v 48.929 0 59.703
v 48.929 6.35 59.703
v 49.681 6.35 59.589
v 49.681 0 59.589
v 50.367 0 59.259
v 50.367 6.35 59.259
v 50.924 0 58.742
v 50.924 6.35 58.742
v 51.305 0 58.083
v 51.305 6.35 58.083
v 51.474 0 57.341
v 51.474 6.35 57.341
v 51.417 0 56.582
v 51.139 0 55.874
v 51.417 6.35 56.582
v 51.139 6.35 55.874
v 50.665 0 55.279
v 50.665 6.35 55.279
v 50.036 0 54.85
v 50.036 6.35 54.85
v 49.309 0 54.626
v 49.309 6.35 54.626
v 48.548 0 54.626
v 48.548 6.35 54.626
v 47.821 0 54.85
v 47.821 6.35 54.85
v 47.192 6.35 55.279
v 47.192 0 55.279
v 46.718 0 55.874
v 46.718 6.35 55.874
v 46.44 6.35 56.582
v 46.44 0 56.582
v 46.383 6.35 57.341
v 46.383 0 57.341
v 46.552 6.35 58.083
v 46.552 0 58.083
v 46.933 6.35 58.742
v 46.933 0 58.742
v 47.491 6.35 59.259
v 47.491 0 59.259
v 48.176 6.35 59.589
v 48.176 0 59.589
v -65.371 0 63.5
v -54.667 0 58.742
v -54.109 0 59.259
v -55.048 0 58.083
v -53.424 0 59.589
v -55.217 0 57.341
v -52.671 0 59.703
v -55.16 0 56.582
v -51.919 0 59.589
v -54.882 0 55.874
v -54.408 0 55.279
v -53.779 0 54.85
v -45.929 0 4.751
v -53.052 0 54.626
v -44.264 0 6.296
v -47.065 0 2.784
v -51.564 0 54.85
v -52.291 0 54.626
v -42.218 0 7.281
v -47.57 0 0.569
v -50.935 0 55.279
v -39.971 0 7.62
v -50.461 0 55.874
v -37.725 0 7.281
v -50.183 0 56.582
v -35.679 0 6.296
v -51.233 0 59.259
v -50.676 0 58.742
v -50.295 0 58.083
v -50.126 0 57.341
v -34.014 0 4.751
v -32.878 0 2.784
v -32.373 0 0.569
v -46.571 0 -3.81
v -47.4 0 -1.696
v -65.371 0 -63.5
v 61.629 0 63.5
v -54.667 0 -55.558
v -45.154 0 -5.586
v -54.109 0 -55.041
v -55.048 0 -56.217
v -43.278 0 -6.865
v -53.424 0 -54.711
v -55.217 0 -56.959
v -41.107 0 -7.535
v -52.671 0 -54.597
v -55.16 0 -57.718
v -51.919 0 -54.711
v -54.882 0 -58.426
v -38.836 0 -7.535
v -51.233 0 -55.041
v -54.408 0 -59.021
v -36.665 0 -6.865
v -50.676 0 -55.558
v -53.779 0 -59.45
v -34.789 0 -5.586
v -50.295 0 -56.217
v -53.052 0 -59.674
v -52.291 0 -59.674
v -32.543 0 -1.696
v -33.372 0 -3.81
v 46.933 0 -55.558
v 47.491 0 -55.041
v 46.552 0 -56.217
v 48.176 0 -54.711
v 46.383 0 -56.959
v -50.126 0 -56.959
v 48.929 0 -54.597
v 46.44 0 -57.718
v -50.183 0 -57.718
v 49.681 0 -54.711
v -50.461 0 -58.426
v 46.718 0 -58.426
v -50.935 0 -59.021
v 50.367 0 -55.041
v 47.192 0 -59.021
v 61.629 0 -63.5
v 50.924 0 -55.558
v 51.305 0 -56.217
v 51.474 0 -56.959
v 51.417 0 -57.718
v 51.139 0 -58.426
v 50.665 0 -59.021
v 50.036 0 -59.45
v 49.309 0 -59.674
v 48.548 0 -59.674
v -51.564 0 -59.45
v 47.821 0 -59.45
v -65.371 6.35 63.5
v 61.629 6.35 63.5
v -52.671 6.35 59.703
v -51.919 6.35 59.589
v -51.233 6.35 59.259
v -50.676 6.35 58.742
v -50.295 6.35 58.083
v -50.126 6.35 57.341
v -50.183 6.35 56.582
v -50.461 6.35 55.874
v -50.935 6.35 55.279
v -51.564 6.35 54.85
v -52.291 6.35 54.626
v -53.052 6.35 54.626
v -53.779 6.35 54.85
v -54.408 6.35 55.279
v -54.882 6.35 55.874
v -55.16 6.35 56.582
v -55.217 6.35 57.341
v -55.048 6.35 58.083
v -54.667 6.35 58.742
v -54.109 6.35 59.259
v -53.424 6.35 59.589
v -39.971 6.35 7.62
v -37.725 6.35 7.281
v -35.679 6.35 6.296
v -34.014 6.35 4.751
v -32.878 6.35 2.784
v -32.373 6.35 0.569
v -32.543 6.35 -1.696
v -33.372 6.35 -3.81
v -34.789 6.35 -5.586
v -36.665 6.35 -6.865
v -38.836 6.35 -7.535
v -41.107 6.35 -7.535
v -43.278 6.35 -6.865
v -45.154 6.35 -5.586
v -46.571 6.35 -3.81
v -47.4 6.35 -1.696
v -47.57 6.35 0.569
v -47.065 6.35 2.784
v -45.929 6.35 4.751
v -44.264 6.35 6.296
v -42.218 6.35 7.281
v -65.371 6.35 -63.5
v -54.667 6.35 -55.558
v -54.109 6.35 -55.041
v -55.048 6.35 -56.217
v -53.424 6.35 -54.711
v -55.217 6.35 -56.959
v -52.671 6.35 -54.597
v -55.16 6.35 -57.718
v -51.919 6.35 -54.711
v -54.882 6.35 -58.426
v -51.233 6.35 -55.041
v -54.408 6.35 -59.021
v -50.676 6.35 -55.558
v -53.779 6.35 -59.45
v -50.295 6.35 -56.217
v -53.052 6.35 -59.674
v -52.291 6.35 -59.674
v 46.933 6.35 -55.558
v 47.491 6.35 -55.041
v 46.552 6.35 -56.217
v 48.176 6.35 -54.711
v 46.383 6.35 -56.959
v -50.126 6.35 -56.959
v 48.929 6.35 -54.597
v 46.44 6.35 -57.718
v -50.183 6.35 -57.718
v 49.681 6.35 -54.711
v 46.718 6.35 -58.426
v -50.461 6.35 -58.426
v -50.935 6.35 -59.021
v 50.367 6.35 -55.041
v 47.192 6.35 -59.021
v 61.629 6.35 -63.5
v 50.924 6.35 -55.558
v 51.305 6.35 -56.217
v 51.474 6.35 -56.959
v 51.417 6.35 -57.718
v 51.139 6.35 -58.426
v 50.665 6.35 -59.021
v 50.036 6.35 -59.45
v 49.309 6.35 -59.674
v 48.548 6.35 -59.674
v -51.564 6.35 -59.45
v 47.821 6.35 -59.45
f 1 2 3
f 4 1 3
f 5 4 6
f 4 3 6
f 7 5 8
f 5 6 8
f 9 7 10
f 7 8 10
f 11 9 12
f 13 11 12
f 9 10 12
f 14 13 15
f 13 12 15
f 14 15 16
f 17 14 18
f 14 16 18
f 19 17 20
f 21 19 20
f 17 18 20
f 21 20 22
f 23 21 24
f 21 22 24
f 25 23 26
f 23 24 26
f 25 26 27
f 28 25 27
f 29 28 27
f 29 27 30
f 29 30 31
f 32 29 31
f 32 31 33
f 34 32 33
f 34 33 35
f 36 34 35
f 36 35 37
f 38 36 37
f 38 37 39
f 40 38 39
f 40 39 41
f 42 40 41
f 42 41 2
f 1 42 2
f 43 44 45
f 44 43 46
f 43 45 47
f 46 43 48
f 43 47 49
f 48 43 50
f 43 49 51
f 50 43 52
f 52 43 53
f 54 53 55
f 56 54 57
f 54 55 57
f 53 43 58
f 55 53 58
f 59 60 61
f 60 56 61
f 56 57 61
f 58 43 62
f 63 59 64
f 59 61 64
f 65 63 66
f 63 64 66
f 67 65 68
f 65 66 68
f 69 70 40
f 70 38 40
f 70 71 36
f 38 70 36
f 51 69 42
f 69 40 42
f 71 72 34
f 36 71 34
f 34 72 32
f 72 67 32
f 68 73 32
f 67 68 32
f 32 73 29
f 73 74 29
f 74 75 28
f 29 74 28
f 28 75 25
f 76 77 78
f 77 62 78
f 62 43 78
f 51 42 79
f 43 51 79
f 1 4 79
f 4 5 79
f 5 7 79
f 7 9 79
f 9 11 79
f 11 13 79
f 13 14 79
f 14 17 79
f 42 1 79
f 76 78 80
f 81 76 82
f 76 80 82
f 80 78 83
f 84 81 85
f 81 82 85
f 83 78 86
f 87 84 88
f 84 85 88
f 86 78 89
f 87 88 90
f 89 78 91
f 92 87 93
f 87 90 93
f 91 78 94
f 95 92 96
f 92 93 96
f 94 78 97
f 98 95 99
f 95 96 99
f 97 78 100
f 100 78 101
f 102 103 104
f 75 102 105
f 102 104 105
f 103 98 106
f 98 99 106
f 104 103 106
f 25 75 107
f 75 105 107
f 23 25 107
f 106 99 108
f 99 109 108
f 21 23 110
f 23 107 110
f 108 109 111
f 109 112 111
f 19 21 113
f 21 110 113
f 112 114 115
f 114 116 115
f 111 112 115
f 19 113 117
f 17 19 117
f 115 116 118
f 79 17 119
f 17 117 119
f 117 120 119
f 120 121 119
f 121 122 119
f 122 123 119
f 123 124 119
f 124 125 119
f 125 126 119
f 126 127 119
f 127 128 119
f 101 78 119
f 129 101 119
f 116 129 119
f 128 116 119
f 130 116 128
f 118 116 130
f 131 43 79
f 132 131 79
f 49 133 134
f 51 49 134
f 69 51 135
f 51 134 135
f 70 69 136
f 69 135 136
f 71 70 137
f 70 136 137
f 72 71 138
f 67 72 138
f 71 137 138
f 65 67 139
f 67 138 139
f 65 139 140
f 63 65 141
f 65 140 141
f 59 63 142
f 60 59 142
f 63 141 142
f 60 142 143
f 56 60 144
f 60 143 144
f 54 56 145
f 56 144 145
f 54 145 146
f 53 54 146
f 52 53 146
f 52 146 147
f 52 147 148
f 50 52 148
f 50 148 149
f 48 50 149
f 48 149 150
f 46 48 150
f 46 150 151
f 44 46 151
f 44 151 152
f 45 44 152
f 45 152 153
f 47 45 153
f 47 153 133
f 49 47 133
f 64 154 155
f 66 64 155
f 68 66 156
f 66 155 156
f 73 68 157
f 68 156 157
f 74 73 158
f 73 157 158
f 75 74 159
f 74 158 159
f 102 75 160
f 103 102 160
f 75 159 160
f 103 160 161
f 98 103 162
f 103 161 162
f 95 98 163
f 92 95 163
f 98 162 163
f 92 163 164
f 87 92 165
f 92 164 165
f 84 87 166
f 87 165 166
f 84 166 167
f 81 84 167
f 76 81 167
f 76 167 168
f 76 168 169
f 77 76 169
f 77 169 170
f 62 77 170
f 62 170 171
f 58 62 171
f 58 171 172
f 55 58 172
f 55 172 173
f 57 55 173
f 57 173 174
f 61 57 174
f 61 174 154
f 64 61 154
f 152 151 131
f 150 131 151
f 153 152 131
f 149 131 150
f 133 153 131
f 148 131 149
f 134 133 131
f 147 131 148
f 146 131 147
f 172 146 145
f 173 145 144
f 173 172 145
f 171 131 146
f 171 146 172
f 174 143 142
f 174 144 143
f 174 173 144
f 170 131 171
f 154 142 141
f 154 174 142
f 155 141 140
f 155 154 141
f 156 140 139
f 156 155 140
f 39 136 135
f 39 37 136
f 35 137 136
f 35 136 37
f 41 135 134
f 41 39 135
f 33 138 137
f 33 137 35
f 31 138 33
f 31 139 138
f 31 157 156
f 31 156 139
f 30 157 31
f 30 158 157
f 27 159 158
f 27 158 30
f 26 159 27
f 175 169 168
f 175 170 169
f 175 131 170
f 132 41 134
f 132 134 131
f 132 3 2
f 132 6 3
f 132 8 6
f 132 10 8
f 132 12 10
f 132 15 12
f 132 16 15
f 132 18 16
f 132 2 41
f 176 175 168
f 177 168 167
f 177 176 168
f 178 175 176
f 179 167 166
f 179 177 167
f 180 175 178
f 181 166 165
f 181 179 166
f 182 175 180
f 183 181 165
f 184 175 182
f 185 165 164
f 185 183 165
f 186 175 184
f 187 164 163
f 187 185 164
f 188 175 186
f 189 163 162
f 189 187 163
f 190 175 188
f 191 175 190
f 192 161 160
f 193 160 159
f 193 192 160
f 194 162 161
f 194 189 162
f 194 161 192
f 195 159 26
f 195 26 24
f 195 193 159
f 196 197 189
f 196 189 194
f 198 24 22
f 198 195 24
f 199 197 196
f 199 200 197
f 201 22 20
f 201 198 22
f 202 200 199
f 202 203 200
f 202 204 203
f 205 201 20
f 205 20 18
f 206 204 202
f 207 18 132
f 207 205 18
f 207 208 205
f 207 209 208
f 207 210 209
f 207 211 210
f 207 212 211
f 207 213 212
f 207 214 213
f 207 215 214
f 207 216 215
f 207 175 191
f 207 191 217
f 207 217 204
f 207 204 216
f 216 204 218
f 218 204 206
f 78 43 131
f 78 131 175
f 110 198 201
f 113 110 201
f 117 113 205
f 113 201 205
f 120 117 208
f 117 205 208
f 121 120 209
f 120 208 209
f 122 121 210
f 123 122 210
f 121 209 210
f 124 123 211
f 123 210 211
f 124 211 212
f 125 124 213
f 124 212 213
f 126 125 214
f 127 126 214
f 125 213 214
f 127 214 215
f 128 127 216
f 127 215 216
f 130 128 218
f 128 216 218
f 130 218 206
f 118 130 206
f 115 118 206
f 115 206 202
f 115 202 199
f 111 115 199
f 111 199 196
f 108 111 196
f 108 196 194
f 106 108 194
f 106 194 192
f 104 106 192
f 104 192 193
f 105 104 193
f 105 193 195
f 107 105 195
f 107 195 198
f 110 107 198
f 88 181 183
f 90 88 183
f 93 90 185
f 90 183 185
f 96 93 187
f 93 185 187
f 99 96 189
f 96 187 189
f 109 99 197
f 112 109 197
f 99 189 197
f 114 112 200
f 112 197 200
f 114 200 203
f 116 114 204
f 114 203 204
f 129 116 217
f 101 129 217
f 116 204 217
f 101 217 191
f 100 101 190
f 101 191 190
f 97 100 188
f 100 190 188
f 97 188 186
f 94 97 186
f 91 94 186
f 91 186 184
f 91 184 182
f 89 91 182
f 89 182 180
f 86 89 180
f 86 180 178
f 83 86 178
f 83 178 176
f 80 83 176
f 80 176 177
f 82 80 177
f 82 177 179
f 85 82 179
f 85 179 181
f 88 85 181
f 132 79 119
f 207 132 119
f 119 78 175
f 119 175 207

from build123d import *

# Parameters (mm, degrees)
SKETCH2_W           = 127
SKETCH2_H           = 127
BOSS_EXTRUDE1_DEPTH = 6.35
SKETCH6_R           = 2.5527
CUT_EXTRUDE3_DEPTH  = 9.525
CUT_EXTRUDE4_REACH  = 93.356
SKETCH7_R           = 7.62


with BuildPart() as part:
    # Sketch2 → Boss-Extrude1 (new body)
    with BuildSketch(Plane(origin=(0, 0, 0), x_dir=(1, 0, 0), z_dir=(0, 1, 0))):
        with Locations((-1.871480339, 0)):
            Rectangle(SKETCH2_W, SKETCH2_H)
    extrude(amount=BOSS_EXTRUDE1_DEPTH)

    # Sketch6 → Cut-Extrude3 (cut)
    with BuildSketch(Plane(origin=(0, 6.35, 0), x_dir=(1, 0, 0), z_dir=(0, 1, 0))):
        with Locations(Location((-52.671480339, 57.15, 0), (0, 0, 270))):
            Circle(SKETCH6_R)
        with Locations(Location((-52.671480339, -57.15, 0), (0, 0, 270))):
            Circle(SKETCH6_R)
        with Locations(Location((48.928519661, -57.15, 0), (0, 0, 270))):
            Circle(SKETCH6_R)
        with Locations(Location((48.928519661, 57.15, 0), (0, 0, 270))):
            Circle(SKETCH6_R)
    extrude(amount=-CUT_EXTRUDE3_DEPTH, mode=Mode.SUBTRACT)

    # Sketch7 → Cut-Extrude4 (cut, up to next)
    with BuildSketch(Plane(origin=(0, 6.35, 0), x_dir=(1, 0, 0), z_dir=(0, 1, 0)), mode=Mode.PRIVATE) as cut_extrude4_sk1:
        with Locations(Location((-39.971480339, 0, 0), (0, 0, 270))):
            Circle(SKETCH7_R)
    cut_extrude4_tool1 = extrude(cut_extrude4_sk1.sketch, amount=-CUT_EXTRUDE4_REACH, mode=Mode.PRIVATE) & part.part
    add(cut_extrude4_tool1.solids().sort_by_distance((-39.97148, 6.35, 0))[0], mode=Mode.SUBTRACT)


solid = part.part
